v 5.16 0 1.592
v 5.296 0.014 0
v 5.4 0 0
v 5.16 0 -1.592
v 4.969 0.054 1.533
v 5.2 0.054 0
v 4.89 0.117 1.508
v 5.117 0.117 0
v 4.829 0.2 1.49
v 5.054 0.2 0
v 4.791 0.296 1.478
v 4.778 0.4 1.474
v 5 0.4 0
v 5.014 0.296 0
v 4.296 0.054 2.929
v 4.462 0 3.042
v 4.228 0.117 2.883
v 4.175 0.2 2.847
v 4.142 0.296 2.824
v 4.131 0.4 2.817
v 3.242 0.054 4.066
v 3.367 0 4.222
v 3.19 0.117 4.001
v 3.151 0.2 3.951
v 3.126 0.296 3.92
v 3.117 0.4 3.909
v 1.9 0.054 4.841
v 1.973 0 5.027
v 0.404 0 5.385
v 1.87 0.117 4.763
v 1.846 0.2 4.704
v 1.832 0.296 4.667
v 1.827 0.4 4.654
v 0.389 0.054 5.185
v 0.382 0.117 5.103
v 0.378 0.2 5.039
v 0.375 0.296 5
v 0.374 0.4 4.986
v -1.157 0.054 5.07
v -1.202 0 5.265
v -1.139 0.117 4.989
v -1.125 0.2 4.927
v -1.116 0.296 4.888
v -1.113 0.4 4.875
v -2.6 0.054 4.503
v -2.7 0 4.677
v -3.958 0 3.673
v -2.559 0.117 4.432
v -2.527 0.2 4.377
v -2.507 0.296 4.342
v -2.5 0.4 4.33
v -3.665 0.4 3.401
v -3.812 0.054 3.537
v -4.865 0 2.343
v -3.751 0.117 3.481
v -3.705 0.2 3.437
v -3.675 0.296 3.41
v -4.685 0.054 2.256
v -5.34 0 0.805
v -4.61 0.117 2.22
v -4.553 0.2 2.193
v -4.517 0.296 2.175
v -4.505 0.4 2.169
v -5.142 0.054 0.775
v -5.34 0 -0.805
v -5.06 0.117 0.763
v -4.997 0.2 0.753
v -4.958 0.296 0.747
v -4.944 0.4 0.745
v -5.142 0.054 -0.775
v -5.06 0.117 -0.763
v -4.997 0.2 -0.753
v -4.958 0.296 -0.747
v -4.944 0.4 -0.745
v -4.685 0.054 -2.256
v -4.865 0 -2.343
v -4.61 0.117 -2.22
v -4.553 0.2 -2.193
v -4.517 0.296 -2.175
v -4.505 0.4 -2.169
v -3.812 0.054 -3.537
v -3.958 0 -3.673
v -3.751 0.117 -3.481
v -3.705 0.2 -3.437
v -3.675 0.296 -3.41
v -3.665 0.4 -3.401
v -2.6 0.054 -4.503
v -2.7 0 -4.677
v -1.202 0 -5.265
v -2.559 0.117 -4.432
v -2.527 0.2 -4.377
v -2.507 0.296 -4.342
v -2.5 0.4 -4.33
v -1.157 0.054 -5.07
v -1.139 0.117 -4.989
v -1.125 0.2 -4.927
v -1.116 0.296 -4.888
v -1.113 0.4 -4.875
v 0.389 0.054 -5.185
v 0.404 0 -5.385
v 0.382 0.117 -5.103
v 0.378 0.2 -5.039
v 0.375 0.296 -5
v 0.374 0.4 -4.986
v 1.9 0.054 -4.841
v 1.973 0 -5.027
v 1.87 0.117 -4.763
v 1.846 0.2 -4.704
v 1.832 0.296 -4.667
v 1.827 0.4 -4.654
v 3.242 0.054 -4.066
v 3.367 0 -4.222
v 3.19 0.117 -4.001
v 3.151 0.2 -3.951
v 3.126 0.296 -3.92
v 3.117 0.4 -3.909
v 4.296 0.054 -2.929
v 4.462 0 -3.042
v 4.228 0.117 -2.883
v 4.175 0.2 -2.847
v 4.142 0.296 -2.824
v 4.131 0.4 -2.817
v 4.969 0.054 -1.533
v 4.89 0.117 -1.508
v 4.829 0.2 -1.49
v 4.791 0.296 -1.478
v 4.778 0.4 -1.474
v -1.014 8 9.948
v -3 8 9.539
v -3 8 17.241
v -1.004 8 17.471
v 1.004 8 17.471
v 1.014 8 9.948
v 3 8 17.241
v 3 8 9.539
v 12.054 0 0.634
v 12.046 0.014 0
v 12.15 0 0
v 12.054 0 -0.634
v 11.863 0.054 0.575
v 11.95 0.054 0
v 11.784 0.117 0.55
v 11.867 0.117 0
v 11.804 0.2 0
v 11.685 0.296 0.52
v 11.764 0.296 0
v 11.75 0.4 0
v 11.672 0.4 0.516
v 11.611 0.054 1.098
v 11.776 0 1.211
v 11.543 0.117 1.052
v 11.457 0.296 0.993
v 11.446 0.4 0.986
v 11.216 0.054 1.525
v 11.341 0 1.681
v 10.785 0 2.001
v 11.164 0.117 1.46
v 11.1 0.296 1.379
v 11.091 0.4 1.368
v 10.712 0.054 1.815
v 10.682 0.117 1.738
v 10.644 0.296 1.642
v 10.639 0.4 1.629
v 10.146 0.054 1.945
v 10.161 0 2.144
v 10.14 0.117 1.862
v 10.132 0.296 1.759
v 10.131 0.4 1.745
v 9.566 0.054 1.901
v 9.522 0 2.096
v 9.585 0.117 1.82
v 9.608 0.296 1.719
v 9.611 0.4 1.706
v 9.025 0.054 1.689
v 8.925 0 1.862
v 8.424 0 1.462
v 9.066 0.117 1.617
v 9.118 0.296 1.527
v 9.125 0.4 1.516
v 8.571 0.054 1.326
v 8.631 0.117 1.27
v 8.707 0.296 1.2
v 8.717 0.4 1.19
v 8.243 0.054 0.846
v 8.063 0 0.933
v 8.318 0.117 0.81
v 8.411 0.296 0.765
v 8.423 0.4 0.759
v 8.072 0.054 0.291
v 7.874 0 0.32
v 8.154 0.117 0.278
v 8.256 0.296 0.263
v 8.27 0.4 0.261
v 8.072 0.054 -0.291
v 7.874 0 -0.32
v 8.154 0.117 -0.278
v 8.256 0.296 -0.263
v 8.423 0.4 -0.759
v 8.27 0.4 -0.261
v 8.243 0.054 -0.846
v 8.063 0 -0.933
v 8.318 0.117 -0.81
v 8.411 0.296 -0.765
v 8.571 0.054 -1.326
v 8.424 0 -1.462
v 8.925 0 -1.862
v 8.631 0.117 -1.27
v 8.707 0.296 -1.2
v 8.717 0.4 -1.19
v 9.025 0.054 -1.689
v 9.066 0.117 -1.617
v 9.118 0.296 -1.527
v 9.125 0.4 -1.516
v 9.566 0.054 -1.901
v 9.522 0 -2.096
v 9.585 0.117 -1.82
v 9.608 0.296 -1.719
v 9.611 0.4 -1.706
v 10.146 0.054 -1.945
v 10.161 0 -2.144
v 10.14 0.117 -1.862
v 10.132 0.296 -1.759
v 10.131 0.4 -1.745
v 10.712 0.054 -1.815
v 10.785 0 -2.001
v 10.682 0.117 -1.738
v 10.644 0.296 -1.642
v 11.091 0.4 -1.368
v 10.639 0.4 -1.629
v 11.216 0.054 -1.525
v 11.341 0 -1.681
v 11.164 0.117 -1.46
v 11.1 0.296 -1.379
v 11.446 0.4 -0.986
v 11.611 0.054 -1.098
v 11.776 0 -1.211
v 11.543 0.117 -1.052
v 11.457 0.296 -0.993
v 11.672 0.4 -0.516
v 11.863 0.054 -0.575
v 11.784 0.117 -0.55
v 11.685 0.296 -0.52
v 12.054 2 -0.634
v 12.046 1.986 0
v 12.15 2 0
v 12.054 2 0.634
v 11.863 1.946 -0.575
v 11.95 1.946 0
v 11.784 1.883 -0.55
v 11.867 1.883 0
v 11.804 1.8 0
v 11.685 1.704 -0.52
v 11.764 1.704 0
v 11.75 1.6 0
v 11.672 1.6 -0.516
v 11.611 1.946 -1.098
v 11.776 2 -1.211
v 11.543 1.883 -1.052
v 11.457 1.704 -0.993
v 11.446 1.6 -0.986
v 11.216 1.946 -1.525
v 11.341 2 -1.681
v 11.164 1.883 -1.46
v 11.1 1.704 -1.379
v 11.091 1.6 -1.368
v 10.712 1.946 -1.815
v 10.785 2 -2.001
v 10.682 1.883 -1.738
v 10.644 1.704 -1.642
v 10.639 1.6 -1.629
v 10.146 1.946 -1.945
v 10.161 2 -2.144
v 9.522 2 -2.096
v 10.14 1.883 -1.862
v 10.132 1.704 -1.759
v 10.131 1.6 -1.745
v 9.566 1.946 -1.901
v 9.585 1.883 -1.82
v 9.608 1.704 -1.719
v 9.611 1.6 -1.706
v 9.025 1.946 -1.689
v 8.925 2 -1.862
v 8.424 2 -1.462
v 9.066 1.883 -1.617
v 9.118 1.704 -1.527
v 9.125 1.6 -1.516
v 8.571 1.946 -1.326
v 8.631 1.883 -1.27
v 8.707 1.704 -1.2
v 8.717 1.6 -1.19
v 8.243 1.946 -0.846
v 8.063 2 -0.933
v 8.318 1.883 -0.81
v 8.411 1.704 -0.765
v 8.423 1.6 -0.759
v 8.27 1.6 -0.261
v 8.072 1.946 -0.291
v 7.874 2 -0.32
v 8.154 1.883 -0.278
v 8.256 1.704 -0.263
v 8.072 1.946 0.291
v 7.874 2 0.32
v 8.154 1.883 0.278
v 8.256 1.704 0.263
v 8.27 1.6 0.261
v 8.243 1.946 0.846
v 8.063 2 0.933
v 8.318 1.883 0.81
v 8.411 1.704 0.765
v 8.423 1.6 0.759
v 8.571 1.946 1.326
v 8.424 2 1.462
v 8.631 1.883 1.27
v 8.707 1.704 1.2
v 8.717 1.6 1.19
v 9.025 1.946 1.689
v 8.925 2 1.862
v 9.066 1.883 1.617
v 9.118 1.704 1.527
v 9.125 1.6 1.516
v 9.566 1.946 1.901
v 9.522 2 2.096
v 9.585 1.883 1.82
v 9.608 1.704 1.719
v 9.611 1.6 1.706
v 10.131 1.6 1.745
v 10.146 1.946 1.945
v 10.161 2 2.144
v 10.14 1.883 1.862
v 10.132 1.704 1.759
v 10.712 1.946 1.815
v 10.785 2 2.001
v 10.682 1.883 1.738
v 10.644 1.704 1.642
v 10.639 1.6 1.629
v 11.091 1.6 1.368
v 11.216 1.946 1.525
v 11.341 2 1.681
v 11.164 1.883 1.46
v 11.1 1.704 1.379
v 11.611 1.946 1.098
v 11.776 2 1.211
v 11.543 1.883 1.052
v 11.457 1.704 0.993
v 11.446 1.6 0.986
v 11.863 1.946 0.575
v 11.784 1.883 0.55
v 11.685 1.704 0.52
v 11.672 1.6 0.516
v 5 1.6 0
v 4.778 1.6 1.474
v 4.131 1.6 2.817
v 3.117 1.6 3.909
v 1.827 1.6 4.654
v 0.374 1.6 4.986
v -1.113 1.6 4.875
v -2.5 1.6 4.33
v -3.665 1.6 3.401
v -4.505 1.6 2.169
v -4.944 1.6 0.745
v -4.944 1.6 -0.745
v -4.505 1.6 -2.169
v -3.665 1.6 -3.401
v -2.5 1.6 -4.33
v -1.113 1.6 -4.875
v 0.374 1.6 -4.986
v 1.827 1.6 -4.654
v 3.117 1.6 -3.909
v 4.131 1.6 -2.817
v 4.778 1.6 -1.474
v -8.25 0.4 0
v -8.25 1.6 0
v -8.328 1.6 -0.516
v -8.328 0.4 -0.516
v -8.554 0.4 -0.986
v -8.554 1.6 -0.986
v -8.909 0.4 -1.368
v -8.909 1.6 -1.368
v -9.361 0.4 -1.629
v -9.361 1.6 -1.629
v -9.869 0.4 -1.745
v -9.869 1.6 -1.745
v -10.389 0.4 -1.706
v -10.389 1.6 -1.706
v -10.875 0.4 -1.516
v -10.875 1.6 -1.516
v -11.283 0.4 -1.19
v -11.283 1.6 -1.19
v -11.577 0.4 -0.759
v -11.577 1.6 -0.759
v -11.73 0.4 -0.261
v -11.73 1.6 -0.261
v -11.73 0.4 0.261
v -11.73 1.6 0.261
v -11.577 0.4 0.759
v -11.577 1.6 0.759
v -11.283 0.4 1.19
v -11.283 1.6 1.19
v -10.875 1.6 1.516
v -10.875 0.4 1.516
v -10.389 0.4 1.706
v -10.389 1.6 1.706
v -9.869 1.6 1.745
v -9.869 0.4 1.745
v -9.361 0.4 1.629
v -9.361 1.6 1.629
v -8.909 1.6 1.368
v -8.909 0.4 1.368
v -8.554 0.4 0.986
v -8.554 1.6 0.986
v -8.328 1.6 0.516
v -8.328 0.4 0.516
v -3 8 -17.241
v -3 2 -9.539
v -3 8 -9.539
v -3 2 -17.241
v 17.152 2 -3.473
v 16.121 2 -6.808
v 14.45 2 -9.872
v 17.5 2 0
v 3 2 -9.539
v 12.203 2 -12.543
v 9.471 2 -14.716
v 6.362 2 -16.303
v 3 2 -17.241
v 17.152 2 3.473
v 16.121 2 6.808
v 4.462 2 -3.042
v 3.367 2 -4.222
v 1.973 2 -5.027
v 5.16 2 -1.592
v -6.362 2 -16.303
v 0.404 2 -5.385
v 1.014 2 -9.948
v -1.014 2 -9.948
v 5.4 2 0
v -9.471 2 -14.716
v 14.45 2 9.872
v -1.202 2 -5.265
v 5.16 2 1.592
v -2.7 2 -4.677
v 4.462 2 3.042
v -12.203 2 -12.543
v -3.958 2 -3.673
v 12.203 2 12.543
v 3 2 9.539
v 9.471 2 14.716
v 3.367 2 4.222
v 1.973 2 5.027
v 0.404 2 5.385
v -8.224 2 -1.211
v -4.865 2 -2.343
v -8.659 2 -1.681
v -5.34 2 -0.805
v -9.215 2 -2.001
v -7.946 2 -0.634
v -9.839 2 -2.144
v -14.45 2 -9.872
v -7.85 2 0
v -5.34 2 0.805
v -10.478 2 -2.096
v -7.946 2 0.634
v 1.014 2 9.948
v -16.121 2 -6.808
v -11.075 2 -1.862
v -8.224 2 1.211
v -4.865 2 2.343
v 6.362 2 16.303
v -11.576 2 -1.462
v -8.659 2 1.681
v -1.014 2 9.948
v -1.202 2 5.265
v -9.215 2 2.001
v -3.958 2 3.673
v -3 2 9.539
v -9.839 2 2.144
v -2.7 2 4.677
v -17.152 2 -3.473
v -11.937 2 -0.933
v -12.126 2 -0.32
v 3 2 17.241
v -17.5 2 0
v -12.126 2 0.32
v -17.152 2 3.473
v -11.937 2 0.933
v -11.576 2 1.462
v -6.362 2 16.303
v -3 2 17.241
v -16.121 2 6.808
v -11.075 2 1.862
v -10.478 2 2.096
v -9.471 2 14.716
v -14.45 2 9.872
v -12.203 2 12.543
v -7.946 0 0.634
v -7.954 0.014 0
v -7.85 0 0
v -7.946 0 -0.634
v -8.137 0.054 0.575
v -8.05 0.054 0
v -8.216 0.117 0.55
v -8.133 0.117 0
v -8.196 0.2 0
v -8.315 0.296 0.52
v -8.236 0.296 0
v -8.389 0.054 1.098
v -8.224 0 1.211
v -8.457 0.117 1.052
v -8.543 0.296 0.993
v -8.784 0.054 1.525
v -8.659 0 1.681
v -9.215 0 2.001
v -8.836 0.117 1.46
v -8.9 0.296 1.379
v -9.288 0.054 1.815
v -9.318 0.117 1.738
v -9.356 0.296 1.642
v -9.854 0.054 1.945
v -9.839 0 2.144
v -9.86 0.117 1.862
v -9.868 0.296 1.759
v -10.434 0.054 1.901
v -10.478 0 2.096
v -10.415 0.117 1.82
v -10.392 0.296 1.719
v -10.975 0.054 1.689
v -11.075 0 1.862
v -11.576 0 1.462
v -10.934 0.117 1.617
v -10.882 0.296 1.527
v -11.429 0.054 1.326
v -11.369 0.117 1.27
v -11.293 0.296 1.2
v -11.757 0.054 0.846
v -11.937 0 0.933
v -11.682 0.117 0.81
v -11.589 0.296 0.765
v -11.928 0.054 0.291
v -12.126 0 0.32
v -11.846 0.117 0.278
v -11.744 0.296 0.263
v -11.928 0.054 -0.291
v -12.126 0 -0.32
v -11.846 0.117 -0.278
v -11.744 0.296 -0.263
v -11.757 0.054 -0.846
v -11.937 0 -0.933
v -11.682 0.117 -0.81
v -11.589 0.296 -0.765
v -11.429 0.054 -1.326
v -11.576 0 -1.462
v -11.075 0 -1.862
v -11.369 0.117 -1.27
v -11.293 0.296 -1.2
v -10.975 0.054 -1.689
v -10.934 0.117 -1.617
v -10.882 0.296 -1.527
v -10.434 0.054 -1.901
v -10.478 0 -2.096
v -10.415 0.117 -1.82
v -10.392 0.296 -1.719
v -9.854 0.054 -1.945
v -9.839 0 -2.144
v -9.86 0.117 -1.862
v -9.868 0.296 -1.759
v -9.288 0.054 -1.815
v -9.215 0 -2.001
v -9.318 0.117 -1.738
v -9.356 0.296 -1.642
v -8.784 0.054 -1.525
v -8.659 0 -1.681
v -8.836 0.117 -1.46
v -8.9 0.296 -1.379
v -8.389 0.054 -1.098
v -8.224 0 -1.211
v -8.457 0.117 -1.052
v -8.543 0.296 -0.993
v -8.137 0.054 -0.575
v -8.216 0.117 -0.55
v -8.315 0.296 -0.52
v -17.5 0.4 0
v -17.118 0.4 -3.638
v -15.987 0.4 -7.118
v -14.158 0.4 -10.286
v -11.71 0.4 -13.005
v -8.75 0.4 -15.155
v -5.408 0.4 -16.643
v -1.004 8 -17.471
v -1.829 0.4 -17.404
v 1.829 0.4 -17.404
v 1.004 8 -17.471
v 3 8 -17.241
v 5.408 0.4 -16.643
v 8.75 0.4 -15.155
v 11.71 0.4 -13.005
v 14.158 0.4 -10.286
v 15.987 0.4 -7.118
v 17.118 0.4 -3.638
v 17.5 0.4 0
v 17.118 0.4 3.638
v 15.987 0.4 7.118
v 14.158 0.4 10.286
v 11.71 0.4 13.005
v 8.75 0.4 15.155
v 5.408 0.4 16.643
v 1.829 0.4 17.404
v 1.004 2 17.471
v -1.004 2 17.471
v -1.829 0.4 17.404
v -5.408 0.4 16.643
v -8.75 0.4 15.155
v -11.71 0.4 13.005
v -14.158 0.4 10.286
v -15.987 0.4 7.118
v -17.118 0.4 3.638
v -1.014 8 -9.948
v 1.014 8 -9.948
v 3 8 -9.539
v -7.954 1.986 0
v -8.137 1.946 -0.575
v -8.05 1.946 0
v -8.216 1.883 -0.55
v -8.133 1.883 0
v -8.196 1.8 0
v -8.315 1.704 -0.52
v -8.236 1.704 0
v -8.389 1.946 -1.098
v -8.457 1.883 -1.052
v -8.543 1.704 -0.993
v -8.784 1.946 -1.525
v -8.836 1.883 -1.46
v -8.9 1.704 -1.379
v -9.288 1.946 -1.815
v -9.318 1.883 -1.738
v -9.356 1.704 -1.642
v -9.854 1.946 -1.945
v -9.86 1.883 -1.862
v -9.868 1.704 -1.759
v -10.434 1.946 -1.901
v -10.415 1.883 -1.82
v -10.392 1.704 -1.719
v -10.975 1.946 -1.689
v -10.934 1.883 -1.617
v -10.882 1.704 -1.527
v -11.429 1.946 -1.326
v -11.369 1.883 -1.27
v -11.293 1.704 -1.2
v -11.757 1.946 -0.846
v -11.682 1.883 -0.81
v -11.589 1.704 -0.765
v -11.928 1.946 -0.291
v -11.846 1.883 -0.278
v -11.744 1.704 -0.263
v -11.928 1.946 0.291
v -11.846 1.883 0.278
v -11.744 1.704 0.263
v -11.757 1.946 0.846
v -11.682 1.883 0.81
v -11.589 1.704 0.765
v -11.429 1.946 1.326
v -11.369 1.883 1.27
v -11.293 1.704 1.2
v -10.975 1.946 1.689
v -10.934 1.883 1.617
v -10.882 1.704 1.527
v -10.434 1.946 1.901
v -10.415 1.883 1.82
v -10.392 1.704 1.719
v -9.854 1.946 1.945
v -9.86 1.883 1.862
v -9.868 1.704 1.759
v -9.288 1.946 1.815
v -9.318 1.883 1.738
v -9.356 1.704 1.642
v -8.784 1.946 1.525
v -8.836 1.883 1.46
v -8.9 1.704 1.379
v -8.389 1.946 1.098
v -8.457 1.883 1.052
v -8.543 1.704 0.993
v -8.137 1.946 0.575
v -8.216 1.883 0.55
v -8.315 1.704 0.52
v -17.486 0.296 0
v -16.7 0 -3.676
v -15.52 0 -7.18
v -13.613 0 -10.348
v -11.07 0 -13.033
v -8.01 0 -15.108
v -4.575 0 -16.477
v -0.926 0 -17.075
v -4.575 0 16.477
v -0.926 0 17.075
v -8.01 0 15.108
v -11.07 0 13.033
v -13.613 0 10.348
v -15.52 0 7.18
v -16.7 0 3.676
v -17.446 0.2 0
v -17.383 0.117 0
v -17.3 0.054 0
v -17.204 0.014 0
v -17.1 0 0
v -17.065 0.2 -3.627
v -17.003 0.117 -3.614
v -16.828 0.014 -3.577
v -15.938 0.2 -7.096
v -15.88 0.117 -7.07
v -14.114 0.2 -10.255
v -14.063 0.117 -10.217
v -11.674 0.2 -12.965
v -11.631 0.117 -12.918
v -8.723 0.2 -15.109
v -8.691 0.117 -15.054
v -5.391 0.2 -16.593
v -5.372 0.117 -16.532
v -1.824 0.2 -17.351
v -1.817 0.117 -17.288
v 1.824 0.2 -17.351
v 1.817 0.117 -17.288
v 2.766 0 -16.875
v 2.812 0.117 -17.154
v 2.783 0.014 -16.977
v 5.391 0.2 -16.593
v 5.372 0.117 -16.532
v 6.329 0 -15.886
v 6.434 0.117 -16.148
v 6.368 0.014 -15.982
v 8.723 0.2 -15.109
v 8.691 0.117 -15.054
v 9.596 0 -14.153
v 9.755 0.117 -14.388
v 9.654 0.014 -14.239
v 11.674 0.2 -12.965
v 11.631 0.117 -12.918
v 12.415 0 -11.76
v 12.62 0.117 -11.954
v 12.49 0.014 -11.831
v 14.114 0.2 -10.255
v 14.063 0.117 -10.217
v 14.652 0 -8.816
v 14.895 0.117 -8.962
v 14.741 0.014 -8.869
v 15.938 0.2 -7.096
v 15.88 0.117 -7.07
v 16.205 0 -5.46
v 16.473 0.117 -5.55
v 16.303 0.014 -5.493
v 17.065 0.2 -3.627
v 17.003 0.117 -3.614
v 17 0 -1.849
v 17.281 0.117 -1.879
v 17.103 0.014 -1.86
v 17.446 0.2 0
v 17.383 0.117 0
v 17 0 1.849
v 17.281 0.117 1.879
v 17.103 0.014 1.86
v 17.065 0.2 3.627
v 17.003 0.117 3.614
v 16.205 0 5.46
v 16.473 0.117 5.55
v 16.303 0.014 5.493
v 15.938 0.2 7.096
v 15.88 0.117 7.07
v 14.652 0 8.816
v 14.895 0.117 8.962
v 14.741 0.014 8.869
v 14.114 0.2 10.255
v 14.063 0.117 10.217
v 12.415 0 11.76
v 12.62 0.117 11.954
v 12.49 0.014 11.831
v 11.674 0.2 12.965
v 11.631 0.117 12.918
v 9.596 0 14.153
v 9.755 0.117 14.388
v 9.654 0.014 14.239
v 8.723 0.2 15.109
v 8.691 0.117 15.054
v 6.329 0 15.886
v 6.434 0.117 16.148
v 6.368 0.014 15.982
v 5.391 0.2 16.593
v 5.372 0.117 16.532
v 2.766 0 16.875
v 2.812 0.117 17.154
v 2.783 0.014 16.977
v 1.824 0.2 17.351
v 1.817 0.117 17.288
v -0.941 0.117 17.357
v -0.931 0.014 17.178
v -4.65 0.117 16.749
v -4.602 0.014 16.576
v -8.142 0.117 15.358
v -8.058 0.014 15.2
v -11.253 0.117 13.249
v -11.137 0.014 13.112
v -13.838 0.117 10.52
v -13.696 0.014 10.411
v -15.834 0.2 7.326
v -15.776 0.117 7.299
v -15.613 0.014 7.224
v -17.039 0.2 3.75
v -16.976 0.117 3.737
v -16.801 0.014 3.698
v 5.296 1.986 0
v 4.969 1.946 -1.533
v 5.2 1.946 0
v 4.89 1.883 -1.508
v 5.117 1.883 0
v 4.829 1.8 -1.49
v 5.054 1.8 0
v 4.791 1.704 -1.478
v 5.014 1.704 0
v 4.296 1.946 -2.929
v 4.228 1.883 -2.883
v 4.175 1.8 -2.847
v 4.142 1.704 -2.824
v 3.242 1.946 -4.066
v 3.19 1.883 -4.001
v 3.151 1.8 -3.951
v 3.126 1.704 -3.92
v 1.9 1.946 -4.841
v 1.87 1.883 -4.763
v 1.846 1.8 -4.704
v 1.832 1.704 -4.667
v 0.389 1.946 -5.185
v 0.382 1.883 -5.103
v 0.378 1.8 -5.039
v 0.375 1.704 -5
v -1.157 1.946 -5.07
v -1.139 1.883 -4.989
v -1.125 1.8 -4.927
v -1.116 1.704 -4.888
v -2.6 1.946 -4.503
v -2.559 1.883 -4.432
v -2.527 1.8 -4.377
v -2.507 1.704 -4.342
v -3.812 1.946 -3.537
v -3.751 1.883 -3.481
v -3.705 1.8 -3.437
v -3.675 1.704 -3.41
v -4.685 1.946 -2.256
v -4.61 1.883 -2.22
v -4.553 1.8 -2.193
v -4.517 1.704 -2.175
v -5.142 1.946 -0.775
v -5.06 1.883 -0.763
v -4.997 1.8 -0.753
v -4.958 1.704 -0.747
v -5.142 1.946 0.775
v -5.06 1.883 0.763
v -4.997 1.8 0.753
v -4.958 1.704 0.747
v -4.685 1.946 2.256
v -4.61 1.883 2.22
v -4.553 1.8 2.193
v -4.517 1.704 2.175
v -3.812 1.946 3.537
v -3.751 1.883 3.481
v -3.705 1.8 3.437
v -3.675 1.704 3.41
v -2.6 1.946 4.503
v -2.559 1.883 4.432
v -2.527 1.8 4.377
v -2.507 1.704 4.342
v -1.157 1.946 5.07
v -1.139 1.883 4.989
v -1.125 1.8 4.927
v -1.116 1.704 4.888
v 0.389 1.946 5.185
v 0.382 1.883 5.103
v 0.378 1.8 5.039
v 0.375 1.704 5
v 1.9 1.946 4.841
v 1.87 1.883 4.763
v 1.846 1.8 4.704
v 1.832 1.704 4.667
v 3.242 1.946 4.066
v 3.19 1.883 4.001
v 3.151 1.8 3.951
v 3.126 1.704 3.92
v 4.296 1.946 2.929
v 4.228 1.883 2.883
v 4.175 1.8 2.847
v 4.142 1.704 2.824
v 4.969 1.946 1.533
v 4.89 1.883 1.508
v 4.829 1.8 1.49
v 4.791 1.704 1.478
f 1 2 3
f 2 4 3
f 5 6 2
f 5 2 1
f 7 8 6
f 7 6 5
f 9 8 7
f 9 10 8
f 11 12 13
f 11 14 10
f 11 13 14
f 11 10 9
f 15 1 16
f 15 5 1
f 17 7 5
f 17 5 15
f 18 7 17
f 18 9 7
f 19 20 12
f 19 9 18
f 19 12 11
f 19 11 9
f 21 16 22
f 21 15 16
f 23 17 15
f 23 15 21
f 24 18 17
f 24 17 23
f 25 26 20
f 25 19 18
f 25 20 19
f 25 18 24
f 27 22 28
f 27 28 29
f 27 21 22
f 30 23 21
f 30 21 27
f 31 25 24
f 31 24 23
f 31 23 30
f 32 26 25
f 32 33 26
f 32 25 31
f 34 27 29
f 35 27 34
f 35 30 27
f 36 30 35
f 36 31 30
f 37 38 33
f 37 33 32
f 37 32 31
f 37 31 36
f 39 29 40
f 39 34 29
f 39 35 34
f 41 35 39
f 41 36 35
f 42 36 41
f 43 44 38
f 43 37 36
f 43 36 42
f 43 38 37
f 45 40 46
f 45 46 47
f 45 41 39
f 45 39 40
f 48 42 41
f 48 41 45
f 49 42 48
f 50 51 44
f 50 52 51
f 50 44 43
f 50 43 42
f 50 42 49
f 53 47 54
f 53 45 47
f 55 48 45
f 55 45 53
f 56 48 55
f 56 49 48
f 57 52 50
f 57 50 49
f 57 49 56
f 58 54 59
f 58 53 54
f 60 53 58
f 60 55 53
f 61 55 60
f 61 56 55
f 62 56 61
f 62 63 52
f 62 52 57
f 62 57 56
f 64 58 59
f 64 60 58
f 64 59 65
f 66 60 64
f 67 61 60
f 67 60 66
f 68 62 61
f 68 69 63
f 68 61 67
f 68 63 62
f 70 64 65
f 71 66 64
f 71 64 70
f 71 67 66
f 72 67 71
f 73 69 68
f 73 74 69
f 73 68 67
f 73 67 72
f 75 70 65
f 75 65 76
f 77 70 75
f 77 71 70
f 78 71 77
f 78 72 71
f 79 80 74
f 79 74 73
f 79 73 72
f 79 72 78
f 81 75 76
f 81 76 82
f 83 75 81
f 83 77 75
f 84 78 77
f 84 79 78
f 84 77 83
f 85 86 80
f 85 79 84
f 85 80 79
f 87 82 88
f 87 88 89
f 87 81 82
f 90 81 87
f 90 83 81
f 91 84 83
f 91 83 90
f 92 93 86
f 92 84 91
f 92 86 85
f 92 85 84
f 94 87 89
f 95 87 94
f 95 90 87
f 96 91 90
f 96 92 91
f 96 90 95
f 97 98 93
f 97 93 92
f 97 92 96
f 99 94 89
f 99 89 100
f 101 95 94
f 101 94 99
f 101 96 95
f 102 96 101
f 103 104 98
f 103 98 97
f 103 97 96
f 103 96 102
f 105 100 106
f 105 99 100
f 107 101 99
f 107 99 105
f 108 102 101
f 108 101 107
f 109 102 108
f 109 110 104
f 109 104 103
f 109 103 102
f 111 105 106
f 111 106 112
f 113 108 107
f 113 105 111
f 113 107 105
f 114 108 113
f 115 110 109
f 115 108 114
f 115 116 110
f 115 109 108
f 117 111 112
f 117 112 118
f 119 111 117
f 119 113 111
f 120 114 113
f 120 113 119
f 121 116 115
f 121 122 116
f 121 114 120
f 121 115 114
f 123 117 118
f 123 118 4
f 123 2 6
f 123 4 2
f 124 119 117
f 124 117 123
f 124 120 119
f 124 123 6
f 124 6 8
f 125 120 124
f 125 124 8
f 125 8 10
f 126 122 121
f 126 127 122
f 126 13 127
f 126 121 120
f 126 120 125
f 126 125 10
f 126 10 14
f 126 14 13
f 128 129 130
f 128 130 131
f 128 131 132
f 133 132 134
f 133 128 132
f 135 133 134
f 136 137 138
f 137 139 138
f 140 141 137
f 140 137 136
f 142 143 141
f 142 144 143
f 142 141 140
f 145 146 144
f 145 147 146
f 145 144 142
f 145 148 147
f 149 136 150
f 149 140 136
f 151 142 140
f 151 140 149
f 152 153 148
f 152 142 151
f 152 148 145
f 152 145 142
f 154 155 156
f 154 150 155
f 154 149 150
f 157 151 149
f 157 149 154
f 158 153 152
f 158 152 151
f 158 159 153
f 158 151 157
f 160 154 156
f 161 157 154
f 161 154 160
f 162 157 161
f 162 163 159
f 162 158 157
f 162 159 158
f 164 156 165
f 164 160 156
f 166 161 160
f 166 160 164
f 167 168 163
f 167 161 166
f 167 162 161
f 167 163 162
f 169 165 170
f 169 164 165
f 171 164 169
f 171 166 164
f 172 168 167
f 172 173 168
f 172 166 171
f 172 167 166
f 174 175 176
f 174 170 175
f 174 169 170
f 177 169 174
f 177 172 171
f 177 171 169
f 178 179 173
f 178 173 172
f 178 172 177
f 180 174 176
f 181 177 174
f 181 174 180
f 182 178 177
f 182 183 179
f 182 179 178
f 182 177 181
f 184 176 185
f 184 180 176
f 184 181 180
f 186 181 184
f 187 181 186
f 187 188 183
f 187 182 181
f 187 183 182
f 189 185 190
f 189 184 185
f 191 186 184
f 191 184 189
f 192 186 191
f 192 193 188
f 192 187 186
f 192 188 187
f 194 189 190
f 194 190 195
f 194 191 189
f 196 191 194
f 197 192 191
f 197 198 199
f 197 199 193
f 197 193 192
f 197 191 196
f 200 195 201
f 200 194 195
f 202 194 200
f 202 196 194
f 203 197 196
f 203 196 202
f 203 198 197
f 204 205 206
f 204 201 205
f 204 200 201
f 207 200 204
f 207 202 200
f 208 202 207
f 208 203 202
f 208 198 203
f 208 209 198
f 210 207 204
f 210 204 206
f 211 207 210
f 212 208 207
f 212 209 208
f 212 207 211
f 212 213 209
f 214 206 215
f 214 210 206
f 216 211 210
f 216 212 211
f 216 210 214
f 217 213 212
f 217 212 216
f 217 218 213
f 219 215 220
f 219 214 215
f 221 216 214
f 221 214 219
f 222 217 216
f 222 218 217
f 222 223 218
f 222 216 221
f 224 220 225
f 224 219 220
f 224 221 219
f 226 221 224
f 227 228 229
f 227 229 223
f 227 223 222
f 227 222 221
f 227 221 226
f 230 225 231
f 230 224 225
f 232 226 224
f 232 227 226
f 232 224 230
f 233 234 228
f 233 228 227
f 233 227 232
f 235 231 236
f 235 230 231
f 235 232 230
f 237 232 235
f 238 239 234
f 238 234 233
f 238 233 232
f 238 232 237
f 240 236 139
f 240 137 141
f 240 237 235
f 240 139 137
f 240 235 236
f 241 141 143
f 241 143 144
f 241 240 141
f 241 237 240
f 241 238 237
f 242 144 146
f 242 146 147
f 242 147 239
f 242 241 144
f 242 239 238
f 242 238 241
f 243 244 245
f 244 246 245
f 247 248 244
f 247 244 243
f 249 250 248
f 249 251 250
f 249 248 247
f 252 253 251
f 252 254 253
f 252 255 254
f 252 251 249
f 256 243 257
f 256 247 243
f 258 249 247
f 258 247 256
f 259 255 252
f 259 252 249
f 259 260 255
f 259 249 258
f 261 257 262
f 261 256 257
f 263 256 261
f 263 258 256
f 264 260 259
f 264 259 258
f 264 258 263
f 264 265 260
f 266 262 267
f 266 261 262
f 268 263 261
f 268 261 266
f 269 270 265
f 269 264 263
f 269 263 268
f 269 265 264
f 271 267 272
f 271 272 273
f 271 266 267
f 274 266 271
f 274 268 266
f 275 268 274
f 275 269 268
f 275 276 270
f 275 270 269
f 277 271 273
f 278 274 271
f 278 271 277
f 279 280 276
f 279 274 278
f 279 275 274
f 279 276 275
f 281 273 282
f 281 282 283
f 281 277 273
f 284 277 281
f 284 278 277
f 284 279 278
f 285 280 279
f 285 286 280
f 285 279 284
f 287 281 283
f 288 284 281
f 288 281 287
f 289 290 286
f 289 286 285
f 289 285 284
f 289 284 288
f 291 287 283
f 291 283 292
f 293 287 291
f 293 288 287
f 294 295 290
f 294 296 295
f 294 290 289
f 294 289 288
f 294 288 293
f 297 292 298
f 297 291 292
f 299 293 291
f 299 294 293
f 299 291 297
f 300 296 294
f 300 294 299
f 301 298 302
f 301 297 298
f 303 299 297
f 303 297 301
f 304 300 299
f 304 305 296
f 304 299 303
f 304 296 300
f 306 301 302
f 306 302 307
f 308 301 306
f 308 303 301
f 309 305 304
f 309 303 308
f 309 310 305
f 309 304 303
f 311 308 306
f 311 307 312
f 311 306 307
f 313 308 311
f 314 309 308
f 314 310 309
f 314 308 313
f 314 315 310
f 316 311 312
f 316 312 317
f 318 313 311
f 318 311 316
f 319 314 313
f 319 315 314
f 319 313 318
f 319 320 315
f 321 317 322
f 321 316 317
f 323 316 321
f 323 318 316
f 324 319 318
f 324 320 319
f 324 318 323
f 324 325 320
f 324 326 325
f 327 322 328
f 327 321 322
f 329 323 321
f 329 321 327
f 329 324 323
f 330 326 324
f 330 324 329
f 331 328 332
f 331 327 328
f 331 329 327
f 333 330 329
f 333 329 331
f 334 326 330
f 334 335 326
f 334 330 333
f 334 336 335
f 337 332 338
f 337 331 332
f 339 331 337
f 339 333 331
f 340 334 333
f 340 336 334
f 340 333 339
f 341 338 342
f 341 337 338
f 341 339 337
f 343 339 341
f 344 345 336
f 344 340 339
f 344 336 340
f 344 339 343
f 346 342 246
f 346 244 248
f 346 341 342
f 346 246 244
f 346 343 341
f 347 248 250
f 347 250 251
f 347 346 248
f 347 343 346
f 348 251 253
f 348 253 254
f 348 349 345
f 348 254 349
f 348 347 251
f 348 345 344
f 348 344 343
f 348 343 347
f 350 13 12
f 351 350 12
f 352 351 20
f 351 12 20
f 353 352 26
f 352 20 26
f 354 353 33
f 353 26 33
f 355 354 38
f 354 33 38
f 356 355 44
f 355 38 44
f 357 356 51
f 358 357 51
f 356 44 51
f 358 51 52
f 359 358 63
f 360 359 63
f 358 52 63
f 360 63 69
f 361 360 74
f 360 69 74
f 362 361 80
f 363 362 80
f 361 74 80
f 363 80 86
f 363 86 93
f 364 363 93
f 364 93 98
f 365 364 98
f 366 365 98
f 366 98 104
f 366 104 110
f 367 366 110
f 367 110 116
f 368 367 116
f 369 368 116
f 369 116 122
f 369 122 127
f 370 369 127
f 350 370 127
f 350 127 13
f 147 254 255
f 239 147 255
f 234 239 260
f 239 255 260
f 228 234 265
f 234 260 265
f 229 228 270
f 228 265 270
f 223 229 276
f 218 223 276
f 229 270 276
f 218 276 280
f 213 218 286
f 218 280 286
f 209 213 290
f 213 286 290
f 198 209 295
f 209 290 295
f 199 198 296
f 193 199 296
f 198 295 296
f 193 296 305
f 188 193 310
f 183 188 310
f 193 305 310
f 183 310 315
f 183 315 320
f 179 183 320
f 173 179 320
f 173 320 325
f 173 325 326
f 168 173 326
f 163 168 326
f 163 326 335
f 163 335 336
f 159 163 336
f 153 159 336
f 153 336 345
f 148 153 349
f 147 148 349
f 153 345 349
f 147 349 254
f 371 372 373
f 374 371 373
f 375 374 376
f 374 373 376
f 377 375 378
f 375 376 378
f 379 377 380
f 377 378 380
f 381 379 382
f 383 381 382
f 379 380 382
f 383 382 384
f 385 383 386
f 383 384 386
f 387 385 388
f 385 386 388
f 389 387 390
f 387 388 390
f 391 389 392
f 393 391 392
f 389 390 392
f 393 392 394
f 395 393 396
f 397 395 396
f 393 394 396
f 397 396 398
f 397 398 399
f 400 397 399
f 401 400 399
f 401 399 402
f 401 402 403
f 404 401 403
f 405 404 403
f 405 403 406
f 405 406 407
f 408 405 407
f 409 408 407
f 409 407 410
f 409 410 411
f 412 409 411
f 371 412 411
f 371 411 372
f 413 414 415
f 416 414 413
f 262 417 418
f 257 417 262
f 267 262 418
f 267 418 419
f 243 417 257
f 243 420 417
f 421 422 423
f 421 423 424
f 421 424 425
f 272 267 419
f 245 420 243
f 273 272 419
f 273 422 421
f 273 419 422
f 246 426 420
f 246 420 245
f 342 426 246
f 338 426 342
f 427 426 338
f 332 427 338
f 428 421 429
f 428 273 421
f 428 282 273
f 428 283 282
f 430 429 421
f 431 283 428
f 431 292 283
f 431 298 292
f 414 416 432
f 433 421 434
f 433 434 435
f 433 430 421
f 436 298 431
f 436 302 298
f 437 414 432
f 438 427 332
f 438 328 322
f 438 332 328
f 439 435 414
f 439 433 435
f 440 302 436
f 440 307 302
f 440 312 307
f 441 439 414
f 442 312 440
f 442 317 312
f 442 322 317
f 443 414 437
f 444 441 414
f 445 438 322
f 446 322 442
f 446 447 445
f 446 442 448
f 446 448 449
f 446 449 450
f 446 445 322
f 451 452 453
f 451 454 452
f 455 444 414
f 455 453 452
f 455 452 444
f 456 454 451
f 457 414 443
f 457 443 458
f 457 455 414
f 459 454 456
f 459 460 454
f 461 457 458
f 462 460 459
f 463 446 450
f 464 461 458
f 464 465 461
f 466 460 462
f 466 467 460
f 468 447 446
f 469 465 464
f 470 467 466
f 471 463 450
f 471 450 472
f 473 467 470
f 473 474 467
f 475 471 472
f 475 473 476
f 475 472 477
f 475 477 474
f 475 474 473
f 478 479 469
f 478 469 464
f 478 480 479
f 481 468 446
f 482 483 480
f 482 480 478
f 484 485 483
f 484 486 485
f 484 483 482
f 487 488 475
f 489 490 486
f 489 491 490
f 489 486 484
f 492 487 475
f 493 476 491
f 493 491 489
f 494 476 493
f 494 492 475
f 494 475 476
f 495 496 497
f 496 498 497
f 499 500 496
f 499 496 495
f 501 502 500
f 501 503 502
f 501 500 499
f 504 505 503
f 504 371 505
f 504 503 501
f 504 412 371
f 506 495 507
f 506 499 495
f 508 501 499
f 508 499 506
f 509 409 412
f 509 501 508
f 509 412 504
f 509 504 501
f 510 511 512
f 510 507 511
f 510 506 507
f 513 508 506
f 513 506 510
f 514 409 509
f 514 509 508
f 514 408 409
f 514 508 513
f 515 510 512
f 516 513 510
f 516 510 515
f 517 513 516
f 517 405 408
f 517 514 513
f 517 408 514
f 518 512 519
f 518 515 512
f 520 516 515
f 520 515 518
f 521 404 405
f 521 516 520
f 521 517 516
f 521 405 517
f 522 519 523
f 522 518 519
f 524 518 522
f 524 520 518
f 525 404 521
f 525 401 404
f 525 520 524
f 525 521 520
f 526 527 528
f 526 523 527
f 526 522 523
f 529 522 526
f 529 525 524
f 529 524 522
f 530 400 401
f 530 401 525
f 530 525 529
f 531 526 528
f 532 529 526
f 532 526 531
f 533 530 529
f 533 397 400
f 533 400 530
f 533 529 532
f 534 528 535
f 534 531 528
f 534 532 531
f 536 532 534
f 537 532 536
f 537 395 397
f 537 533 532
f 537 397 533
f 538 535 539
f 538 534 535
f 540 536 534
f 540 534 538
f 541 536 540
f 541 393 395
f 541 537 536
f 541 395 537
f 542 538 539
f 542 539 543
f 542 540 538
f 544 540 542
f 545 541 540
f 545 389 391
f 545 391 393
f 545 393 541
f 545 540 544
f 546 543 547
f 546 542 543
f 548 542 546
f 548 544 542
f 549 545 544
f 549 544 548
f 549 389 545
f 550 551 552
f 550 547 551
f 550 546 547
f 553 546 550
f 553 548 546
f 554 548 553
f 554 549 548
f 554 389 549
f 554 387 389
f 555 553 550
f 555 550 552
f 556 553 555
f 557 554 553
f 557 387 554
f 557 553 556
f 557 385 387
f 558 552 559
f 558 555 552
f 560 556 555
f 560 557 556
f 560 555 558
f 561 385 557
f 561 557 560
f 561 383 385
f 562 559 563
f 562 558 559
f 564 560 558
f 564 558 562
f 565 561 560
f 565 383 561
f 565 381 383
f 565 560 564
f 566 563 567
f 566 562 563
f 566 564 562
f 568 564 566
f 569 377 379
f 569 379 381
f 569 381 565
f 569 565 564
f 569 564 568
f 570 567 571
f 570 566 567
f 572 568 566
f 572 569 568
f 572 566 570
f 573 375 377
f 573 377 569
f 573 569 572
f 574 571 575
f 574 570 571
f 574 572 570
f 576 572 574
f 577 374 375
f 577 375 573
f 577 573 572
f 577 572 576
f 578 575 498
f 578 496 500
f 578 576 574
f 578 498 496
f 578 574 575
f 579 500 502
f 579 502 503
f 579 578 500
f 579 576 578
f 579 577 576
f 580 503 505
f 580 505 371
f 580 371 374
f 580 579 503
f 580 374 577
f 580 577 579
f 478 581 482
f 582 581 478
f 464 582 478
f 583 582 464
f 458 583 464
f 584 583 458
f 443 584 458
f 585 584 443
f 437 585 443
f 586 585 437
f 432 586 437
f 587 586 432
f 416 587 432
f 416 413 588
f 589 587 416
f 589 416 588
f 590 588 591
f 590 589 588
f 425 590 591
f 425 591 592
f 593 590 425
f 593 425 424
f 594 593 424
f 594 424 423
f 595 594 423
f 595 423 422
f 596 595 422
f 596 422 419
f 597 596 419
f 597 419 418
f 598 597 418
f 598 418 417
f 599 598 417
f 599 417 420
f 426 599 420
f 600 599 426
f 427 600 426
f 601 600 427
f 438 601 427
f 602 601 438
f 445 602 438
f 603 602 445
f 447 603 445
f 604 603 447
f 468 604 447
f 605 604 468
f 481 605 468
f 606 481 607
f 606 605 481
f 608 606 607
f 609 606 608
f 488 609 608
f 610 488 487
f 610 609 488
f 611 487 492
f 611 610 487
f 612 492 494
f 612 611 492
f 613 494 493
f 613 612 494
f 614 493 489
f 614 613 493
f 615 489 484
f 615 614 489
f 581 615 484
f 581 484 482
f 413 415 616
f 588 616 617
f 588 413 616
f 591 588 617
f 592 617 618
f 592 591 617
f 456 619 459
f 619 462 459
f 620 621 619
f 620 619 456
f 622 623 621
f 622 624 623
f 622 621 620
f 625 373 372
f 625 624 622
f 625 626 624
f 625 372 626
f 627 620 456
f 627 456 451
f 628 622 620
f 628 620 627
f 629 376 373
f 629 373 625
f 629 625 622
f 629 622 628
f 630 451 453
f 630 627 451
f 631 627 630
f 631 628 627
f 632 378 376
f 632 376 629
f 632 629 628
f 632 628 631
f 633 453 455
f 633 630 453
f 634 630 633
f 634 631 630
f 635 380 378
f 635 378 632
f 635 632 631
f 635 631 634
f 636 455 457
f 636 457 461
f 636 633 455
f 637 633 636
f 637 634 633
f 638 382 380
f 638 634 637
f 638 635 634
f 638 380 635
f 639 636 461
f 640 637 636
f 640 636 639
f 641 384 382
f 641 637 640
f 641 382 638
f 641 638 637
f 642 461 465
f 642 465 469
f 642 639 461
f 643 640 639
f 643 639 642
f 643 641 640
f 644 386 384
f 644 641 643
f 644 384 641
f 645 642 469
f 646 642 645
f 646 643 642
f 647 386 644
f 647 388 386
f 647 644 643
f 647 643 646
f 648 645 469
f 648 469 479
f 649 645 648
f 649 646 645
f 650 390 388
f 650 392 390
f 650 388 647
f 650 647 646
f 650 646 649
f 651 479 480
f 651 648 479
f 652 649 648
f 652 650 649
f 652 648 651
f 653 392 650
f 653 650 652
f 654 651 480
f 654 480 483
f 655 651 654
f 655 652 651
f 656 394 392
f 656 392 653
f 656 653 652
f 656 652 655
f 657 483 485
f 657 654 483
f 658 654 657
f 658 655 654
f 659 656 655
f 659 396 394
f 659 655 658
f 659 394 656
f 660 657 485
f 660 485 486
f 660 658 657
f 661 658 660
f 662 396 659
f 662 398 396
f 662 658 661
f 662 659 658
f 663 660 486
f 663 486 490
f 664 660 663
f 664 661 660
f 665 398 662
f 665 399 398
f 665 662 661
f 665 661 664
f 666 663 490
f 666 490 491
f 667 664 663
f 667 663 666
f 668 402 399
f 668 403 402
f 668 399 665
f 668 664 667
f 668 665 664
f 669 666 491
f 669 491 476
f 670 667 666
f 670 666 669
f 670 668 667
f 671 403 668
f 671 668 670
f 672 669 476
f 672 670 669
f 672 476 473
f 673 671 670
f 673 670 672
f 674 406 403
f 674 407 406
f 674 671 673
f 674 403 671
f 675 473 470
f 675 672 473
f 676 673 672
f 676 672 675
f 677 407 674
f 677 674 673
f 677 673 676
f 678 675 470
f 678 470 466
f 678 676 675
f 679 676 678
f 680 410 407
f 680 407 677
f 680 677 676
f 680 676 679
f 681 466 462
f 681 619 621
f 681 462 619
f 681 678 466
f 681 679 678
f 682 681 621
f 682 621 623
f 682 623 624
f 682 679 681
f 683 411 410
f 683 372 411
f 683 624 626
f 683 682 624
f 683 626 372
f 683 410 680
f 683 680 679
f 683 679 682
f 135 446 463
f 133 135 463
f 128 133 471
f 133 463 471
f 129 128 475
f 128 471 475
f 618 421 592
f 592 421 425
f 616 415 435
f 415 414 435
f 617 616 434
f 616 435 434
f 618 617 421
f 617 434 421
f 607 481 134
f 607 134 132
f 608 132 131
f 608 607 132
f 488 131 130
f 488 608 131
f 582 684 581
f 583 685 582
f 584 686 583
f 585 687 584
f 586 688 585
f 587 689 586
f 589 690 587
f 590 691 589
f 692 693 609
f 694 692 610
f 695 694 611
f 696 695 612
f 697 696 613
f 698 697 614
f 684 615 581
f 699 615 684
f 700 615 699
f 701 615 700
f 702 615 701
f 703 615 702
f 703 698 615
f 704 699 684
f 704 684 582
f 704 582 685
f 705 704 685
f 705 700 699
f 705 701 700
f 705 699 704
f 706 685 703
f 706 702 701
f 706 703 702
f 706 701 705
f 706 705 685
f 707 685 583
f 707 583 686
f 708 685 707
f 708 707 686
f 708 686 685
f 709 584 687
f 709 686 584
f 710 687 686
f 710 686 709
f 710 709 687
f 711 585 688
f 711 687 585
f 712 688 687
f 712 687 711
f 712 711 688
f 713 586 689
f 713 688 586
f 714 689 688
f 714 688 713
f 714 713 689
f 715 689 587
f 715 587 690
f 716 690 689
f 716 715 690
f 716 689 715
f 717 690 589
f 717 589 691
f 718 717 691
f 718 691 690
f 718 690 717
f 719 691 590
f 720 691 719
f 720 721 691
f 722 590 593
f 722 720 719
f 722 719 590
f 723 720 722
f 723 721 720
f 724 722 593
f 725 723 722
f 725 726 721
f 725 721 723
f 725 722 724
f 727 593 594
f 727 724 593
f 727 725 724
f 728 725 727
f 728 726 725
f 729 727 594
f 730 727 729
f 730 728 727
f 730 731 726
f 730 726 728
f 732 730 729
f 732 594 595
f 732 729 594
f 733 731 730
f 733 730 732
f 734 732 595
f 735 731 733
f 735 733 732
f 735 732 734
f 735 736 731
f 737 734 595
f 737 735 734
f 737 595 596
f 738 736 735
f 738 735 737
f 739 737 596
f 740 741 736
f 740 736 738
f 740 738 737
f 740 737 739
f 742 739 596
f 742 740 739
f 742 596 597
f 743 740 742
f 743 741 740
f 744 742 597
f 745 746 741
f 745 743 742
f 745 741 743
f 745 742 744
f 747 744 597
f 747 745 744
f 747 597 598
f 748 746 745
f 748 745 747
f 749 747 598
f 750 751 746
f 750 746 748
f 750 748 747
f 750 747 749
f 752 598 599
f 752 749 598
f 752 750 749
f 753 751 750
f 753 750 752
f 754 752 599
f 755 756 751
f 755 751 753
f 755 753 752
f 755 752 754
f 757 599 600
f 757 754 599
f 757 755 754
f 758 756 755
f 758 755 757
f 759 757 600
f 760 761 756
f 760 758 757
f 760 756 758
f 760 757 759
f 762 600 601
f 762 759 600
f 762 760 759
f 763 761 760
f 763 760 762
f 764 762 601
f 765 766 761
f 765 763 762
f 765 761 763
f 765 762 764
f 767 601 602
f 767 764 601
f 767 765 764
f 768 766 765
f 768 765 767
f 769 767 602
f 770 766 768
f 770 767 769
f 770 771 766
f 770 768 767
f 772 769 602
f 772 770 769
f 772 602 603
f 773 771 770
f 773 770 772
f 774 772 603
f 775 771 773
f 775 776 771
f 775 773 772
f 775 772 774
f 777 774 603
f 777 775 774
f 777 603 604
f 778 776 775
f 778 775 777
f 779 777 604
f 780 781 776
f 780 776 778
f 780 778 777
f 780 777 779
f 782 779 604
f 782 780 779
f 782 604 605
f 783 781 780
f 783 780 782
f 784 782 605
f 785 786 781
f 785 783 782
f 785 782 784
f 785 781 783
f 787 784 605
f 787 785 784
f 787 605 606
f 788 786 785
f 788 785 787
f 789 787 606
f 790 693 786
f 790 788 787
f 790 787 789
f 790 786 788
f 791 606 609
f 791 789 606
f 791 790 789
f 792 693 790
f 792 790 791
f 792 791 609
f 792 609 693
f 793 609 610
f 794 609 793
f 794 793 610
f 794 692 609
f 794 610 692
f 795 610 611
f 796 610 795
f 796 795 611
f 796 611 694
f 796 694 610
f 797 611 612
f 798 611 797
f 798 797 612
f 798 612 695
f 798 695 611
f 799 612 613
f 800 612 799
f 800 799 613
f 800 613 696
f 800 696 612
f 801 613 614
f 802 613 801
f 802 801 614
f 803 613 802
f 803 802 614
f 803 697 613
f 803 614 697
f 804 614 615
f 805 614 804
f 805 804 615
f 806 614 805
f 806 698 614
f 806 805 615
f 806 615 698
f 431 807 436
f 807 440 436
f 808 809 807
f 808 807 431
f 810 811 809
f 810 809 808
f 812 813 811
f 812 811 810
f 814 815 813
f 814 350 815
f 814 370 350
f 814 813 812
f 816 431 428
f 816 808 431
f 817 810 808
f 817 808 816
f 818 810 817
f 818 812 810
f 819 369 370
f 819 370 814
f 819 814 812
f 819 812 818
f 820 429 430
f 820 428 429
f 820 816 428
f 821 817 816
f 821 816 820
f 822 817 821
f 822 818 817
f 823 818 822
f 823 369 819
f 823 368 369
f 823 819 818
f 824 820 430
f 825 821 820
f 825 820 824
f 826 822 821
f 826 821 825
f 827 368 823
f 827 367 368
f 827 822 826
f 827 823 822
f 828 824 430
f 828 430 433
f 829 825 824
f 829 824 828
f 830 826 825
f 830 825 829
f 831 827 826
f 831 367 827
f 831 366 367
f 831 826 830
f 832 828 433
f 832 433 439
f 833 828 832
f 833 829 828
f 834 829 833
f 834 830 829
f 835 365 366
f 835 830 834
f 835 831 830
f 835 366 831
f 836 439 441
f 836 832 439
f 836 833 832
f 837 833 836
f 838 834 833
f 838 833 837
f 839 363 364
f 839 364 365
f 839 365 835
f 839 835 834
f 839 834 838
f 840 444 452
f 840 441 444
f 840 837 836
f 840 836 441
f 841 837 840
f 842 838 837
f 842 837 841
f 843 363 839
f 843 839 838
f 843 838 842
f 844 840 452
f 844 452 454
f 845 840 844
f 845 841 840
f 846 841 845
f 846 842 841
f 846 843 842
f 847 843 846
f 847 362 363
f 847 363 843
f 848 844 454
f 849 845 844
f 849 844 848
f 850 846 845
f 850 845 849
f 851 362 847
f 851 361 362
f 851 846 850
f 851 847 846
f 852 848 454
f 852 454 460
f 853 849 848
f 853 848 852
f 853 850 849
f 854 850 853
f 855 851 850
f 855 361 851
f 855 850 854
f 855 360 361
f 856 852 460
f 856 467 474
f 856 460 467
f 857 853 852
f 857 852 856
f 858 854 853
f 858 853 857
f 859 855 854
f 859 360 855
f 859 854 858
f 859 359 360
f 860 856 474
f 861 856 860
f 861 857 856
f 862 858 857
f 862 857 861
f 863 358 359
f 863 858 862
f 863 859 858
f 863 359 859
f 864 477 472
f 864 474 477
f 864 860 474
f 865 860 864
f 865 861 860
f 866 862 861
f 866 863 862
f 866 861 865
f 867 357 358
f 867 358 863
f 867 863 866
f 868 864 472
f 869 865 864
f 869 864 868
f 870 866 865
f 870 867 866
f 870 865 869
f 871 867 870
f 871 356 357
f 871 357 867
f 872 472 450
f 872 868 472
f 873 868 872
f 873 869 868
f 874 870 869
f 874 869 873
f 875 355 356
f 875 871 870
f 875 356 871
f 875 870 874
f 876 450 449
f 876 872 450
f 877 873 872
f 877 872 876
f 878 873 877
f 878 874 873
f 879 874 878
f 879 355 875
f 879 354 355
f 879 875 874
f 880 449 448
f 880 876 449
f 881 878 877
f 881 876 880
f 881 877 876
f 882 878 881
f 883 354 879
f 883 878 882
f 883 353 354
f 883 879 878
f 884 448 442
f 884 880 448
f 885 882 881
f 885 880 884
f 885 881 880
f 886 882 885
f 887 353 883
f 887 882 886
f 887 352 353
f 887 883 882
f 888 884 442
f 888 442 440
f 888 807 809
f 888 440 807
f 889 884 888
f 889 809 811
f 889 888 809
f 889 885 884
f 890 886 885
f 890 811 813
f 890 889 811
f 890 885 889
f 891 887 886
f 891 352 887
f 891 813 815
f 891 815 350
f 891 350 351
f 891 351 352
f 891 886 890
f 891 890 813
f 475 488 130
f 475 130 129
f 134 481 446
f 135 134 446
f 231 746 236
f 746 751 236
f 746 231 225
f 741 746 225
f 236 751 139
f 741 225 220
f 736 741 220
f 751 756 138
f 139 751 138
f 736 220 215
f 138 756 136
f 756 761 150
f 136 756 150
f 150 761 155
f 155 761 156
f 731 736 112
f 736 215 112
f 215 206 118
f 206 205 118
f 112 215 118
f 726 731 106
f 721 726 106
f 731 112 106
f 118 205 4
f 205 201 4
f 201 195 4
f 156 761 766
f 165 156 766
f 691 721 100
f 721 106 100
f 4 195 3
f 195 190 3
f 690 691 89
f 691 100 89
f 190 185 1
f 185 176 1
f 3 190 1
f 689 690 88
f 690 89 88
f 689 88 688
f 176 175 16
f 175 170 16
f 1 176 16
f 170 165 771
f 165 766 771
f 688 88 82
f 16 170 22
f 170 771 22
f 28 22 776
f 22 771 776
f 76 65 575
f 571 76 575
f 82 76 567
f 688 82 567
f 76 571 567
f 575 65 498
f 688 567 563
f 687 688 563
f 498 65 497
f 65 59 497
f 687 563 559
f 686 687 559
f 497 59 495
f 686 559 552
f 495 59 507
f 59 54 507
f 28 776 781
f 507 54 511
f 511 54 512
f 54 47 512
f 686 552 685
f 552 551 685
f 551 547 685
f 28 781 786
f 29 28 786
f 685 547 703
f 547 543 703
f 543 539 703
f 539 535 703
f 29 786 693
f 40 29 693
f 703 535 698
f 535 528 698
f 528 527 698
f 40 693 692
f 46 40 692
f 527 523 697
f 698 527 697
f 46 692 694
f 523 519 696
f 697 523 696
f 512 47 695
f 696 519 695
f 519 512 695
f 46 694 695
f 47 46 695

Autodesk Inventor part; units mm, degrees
ref_plane "YZ Plane" through (0, 0, 0) normal (1, 0, 0) x (0, 1, 0)
ref_plane "XZ Plane" through (0, 0, 0) normal (0, 1, 0) x (-1, 0, 0)
ref_plane "XY Plane" through (0, 0, 0) normal (0, 0, 1) x (1, 0, 0)
sketch "Sketch1" plane through (0, 0, 0) normal (0, 1, 0) x (-1, 0, 0)
  circle A0 centre (0, 0) radius 17.5
  dimension "d0" = 35
extrude "Extrusion1" add sketch "Sketch1" along normal blind 2
sketch "Sketch2" plane through (0, 2, 0) normal (0, 1, 0) x (1, 0, 0)
  arc A0 (-3, -9.5394) -> (3, -9.5394) centre (0, 0) ccw
  line L0 (-3, -17.2409) -> (-3, -9.5394)
  line L1 (3, -17.2409) -> (3, -9.5394)
  line L2 (-3, 9.5394) -> (-3, 17.2409)
  circle A1 centre (0, 0) radius 17.5 projected
  line L3 (3, 9.5394) -> (3, 17.2409)
  arc A2 (-3, 9.5394) -> (-3, -9.5394) centre (0, 0) ccw construction
  arc A3 (3, -9.5394) -> (3, 9.5394) centre (0, 0) ccw construction
  arc A4 (3, 9.5394) -> (-3, 9.5394) centre (0, 0) ccw
  dimension "d3" = 20
  dimension "d4" = 6
  dimension "d5" = 3
extrude "Extrusion2" add sketch "Sketch2" along normal blind 6 contours A0 L1 A1 L0 | A1 L3 A4 L2
sketch "Sketch3" plane through (0, 2, 0) normal (0, 1, 0) x (1, 0, 0)
  circle A0 centre (-10, 0) radius 1.75
  circle A1 centre (10, 0) radius 1.75
  point P0 (0, 0)
  dimension "d8" = 3.5
  dimension "d9" = 20
  dimension "d10" = 10
  dimension "d11" = 3.5
extrude "Extrusion3" cut sketch "Sketch3" against normal up to surface (2 mm away)
sketch "Sketch4" plane through (0, 0, 0) normal (0, -1, 0) x (1, 0, 0)
  circle A0 centre (0, 0) radius 5
  dimension "d14" = 10
extrude "Extrusion4" cut sketch "Sketch4" against normal up to surface (2 mm away)
fillet "Fillet1" radius 0.4 7 edges at (-5, 0, 0) (-5, 2, 0) (17.5, 0, 0) (-11.75, 2, 0) (8.25, 2, 0) (8.25, 0, 0) (-11.75, 0, 0)
properties part number "tensioner_servo"
